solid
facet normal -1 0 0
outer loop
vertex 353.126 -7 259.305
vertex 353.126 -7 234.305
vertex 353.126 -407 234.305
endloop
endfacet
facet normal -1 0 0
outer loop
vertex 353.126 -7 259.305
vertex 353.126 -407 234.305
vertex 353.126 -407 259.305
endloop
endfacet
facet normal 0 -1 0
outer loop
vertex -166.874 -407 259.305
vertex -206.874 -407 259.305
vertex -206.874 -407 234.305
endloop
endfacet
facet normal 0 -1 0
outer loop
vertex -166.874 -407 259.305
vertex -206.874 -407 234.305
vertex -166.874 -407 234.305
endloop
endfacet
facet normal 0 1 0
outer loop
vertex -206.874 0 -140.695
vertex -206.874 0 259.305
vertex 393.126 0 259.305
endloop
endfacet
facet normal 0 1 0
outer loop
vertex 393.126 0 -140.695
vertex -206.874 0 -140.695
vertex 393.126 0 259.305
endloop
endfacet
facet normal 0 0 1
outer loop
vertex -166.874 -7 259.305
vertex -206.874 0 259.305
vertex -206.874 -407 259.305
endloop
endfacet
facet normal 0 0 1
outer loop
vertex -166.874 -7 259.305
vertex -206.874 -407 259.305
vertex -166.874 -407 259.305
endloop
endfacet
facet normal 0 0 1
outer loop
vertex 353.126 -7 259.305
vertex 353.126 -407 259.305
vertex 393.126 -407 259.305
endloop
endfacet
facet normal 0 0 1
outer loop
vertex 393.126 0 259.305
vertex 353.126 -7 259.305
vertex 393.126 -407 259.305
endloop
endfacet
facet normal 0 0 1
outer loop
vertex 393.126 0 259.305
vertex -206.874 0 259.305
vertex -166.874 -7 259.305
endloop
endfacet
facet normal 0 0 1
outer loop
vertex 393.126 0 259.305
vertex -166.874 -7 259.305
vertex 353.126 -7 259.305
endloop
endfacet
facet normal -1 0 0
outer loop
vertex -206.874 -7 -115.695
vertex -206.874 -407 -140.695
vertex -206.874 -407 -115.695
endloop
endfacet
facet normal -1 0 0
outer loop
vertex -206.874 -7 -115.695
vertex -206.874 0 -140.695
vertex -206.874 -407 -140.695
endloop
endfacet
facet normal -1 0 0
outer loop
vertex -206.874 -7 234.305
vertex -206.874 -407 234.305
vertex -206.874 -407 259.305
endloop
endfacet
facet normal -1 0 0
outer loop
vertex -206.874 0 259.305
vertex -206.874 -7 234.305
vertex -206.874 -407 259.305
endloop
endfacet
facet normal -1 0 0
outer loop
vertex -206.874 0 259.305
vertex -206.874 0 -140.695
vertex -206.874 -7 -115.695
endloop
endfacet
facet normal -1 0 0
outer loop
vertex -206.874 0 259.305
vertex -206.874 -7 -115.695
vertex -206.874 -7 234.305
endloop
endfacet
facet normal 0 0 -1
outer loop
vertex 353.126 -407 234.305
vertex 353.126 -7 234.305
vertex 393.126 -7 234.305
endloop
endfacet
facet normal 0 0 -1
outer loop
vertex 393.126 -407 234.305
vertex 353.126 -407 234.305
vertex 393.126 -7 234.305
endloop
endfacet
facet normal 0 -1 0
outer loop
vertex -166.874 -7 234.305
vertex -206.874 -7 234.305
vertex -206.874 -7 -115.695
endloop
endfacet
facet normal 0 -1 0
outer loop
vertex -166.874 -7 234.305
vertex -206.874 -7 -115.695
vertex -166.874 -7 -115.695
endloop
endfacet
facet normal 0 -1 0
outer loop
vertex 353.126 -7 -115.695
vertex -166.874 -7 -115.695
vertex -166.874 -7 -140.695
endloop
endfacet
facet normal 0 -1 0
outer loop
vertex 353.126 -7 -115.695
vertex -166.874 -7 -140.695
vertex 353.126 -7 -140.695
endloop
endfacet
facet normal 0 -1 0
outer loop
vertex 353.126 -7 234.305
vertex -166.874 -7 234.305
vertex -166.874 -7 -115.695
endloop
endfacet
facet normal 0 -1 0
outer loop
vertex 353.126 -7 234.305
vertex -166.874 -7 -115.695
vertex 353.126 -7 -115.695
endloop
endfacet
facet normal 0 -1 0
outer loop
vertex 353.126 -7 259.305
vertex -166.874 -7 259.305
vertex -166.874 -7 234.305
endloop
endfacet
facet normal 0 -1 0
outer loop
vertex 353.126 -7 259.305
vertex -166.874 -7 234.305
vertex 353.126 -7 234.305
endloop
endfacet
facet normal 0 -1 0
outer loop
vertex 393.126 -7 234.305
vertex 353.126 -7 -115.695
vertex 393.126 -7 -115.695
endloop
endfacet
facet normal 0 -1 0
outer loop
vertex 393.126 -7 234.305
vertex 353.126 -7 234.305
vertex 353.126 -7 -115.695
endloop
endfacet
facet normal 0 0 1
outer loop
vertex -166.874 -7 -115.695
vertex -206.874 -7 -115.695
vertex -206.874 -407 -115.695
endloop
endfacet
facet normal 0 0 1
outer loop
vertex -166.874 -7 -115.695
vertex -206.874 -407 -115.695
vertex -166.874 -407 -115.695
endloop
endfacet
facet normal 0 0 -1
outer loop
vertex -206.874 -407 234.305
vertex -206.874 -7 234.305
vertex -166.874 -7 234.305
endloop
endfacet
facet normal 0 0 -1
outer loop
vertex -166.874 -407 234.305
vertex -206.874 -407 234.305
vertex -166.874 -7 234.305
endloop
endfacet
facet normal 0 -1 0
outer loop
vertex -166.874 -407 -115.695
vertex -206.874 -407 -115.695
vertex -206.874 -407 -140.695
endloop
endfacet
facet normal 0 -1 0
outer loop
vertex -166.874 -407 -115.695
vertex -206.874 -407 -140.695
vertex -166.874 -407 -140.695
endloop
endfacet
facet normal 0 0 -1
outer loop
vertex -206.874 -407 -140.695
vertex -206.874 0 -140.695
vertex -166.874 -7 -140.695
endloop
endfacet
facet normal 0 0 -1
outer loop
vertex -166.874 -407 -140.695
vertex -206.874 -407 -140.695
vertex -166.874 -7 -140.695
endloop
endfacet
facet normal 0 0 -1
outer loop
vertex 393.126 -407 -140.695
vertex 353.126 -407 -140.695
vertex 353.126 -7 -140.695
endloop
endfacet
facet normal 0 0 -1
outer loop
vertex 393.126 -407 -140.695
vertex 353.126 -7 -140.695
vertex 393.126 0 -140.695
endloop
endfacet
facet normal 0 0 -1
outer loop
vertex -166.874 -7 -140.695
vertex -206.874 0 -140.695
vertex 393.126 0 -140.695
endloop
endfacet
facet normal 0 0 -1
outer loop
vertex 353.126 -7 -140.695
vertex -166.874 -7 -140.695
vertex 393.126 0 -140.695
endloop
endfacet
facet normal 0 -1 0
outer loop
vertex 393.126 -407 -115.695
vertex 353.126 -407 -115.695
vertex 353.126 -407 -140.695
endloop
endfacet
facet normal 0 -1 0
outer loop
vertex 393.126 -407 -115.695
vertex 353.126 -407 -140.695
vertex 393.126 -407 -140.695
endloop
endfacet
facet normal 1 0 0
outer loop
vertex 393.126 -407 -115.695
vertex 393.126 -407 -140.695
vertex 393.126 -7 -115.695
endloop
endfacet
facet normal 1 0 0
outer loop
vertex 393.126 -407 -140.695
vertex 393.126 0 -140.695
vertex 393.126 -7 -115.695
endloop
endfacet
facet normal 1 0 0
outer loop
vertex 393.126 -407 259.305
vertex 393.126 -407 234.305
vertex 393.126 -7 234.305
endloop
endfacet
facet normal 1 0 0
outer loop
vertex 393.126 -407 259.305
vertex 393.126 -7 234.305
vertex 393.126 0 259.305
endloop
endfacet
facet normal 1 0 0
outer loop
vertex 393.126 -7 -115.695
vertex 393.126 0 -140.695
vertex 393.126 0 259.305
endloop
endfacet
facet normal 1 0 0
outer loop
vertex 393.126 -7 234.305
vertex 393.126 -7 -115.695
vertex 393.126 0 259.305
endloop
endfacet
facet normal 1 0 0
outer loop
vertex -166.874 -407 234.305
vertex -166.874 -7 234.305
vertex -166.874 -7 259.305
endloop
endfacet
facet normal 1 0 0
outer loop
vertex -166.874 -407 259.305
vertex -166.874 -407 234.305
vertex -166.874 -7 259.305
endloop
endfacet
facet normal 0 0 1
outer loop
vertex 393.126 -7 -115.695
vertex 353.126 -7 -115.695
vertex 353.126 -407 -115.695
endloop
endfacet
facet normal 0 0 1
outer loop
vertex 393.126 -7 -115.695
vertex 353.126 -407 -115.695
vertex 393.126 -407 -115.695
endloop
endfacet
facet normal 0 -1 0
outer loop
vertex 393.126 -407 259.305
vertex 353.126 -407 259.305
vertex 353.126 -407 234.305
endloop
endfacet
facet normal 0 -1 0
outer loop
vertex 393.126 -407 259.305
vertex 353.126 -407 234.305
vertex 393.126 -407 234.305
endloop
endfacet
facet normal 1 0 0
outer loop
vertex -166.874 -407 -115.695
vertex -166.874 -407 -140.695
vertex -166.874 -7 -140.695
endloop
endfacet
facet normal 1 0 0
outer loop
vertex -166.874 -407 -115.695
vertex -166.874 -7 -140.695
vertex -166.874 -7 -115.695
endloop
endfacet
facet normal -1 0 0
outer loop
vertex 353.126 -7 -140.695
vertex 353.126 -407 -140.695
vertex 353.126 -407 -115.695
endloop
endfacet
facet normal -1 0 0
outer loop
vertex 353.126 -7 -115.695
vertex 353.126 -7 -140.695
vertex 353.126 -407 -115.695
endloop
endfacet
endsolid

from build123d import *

# Parameters (mm, degrees)
F0_W     = 600
F0_H     = 400
F1_DEPTH = 7
F2_W     = 40
F2_H     = 25
F3_DEPTH = 400
F4_DEPTH = 400
F5_DEPTH = 400
F6_DEPTH = 400


with BuildPart() as f1:
    # F0 (on Front) → F1 (new body)
    with BuildSketch(Plane.XZ):
        with Locations((93.126289, 59.305324)):
            Rectangle(F0_W, F0_H)
    extrude(amount=F1_DEPTH)

    # F2 (on face) → F3 (join)
    with BuildSketch(Plane.XZ.offset(7)):
        with Locations((-186.873711, 246.805324)):
            Rectangle(F2_W, F2_H)
    extrude(amount=F3_DEPTH)

    # F2 (on face) → F4 (join)
    with BuildSketch(Plane.XZ.offset(7)):
        with Locations((-186.873711, -128.194676)):
            Rectangle(F2_W, F2_H)
    extrude(amount=F4_DEPTH)

    # F2 (on face) → F5 (join)
    with BuildSketch(Plane.XZ.offset(7)):
        with Locations((373.126289, 246.805324)):
            Rectangle(F2_W, F2_H)
    extrude(amount=F5_DEPTH)

    # F2 (on face) → F6 (join)
    with BuildSketch(Plane.XZ.offset(7)):
        with Locations((373.126289, -128.194676)):
            Rectangle(F2_W, F2_H)
    extrude(amount=F6_DEPTH)


solid = f1.part
